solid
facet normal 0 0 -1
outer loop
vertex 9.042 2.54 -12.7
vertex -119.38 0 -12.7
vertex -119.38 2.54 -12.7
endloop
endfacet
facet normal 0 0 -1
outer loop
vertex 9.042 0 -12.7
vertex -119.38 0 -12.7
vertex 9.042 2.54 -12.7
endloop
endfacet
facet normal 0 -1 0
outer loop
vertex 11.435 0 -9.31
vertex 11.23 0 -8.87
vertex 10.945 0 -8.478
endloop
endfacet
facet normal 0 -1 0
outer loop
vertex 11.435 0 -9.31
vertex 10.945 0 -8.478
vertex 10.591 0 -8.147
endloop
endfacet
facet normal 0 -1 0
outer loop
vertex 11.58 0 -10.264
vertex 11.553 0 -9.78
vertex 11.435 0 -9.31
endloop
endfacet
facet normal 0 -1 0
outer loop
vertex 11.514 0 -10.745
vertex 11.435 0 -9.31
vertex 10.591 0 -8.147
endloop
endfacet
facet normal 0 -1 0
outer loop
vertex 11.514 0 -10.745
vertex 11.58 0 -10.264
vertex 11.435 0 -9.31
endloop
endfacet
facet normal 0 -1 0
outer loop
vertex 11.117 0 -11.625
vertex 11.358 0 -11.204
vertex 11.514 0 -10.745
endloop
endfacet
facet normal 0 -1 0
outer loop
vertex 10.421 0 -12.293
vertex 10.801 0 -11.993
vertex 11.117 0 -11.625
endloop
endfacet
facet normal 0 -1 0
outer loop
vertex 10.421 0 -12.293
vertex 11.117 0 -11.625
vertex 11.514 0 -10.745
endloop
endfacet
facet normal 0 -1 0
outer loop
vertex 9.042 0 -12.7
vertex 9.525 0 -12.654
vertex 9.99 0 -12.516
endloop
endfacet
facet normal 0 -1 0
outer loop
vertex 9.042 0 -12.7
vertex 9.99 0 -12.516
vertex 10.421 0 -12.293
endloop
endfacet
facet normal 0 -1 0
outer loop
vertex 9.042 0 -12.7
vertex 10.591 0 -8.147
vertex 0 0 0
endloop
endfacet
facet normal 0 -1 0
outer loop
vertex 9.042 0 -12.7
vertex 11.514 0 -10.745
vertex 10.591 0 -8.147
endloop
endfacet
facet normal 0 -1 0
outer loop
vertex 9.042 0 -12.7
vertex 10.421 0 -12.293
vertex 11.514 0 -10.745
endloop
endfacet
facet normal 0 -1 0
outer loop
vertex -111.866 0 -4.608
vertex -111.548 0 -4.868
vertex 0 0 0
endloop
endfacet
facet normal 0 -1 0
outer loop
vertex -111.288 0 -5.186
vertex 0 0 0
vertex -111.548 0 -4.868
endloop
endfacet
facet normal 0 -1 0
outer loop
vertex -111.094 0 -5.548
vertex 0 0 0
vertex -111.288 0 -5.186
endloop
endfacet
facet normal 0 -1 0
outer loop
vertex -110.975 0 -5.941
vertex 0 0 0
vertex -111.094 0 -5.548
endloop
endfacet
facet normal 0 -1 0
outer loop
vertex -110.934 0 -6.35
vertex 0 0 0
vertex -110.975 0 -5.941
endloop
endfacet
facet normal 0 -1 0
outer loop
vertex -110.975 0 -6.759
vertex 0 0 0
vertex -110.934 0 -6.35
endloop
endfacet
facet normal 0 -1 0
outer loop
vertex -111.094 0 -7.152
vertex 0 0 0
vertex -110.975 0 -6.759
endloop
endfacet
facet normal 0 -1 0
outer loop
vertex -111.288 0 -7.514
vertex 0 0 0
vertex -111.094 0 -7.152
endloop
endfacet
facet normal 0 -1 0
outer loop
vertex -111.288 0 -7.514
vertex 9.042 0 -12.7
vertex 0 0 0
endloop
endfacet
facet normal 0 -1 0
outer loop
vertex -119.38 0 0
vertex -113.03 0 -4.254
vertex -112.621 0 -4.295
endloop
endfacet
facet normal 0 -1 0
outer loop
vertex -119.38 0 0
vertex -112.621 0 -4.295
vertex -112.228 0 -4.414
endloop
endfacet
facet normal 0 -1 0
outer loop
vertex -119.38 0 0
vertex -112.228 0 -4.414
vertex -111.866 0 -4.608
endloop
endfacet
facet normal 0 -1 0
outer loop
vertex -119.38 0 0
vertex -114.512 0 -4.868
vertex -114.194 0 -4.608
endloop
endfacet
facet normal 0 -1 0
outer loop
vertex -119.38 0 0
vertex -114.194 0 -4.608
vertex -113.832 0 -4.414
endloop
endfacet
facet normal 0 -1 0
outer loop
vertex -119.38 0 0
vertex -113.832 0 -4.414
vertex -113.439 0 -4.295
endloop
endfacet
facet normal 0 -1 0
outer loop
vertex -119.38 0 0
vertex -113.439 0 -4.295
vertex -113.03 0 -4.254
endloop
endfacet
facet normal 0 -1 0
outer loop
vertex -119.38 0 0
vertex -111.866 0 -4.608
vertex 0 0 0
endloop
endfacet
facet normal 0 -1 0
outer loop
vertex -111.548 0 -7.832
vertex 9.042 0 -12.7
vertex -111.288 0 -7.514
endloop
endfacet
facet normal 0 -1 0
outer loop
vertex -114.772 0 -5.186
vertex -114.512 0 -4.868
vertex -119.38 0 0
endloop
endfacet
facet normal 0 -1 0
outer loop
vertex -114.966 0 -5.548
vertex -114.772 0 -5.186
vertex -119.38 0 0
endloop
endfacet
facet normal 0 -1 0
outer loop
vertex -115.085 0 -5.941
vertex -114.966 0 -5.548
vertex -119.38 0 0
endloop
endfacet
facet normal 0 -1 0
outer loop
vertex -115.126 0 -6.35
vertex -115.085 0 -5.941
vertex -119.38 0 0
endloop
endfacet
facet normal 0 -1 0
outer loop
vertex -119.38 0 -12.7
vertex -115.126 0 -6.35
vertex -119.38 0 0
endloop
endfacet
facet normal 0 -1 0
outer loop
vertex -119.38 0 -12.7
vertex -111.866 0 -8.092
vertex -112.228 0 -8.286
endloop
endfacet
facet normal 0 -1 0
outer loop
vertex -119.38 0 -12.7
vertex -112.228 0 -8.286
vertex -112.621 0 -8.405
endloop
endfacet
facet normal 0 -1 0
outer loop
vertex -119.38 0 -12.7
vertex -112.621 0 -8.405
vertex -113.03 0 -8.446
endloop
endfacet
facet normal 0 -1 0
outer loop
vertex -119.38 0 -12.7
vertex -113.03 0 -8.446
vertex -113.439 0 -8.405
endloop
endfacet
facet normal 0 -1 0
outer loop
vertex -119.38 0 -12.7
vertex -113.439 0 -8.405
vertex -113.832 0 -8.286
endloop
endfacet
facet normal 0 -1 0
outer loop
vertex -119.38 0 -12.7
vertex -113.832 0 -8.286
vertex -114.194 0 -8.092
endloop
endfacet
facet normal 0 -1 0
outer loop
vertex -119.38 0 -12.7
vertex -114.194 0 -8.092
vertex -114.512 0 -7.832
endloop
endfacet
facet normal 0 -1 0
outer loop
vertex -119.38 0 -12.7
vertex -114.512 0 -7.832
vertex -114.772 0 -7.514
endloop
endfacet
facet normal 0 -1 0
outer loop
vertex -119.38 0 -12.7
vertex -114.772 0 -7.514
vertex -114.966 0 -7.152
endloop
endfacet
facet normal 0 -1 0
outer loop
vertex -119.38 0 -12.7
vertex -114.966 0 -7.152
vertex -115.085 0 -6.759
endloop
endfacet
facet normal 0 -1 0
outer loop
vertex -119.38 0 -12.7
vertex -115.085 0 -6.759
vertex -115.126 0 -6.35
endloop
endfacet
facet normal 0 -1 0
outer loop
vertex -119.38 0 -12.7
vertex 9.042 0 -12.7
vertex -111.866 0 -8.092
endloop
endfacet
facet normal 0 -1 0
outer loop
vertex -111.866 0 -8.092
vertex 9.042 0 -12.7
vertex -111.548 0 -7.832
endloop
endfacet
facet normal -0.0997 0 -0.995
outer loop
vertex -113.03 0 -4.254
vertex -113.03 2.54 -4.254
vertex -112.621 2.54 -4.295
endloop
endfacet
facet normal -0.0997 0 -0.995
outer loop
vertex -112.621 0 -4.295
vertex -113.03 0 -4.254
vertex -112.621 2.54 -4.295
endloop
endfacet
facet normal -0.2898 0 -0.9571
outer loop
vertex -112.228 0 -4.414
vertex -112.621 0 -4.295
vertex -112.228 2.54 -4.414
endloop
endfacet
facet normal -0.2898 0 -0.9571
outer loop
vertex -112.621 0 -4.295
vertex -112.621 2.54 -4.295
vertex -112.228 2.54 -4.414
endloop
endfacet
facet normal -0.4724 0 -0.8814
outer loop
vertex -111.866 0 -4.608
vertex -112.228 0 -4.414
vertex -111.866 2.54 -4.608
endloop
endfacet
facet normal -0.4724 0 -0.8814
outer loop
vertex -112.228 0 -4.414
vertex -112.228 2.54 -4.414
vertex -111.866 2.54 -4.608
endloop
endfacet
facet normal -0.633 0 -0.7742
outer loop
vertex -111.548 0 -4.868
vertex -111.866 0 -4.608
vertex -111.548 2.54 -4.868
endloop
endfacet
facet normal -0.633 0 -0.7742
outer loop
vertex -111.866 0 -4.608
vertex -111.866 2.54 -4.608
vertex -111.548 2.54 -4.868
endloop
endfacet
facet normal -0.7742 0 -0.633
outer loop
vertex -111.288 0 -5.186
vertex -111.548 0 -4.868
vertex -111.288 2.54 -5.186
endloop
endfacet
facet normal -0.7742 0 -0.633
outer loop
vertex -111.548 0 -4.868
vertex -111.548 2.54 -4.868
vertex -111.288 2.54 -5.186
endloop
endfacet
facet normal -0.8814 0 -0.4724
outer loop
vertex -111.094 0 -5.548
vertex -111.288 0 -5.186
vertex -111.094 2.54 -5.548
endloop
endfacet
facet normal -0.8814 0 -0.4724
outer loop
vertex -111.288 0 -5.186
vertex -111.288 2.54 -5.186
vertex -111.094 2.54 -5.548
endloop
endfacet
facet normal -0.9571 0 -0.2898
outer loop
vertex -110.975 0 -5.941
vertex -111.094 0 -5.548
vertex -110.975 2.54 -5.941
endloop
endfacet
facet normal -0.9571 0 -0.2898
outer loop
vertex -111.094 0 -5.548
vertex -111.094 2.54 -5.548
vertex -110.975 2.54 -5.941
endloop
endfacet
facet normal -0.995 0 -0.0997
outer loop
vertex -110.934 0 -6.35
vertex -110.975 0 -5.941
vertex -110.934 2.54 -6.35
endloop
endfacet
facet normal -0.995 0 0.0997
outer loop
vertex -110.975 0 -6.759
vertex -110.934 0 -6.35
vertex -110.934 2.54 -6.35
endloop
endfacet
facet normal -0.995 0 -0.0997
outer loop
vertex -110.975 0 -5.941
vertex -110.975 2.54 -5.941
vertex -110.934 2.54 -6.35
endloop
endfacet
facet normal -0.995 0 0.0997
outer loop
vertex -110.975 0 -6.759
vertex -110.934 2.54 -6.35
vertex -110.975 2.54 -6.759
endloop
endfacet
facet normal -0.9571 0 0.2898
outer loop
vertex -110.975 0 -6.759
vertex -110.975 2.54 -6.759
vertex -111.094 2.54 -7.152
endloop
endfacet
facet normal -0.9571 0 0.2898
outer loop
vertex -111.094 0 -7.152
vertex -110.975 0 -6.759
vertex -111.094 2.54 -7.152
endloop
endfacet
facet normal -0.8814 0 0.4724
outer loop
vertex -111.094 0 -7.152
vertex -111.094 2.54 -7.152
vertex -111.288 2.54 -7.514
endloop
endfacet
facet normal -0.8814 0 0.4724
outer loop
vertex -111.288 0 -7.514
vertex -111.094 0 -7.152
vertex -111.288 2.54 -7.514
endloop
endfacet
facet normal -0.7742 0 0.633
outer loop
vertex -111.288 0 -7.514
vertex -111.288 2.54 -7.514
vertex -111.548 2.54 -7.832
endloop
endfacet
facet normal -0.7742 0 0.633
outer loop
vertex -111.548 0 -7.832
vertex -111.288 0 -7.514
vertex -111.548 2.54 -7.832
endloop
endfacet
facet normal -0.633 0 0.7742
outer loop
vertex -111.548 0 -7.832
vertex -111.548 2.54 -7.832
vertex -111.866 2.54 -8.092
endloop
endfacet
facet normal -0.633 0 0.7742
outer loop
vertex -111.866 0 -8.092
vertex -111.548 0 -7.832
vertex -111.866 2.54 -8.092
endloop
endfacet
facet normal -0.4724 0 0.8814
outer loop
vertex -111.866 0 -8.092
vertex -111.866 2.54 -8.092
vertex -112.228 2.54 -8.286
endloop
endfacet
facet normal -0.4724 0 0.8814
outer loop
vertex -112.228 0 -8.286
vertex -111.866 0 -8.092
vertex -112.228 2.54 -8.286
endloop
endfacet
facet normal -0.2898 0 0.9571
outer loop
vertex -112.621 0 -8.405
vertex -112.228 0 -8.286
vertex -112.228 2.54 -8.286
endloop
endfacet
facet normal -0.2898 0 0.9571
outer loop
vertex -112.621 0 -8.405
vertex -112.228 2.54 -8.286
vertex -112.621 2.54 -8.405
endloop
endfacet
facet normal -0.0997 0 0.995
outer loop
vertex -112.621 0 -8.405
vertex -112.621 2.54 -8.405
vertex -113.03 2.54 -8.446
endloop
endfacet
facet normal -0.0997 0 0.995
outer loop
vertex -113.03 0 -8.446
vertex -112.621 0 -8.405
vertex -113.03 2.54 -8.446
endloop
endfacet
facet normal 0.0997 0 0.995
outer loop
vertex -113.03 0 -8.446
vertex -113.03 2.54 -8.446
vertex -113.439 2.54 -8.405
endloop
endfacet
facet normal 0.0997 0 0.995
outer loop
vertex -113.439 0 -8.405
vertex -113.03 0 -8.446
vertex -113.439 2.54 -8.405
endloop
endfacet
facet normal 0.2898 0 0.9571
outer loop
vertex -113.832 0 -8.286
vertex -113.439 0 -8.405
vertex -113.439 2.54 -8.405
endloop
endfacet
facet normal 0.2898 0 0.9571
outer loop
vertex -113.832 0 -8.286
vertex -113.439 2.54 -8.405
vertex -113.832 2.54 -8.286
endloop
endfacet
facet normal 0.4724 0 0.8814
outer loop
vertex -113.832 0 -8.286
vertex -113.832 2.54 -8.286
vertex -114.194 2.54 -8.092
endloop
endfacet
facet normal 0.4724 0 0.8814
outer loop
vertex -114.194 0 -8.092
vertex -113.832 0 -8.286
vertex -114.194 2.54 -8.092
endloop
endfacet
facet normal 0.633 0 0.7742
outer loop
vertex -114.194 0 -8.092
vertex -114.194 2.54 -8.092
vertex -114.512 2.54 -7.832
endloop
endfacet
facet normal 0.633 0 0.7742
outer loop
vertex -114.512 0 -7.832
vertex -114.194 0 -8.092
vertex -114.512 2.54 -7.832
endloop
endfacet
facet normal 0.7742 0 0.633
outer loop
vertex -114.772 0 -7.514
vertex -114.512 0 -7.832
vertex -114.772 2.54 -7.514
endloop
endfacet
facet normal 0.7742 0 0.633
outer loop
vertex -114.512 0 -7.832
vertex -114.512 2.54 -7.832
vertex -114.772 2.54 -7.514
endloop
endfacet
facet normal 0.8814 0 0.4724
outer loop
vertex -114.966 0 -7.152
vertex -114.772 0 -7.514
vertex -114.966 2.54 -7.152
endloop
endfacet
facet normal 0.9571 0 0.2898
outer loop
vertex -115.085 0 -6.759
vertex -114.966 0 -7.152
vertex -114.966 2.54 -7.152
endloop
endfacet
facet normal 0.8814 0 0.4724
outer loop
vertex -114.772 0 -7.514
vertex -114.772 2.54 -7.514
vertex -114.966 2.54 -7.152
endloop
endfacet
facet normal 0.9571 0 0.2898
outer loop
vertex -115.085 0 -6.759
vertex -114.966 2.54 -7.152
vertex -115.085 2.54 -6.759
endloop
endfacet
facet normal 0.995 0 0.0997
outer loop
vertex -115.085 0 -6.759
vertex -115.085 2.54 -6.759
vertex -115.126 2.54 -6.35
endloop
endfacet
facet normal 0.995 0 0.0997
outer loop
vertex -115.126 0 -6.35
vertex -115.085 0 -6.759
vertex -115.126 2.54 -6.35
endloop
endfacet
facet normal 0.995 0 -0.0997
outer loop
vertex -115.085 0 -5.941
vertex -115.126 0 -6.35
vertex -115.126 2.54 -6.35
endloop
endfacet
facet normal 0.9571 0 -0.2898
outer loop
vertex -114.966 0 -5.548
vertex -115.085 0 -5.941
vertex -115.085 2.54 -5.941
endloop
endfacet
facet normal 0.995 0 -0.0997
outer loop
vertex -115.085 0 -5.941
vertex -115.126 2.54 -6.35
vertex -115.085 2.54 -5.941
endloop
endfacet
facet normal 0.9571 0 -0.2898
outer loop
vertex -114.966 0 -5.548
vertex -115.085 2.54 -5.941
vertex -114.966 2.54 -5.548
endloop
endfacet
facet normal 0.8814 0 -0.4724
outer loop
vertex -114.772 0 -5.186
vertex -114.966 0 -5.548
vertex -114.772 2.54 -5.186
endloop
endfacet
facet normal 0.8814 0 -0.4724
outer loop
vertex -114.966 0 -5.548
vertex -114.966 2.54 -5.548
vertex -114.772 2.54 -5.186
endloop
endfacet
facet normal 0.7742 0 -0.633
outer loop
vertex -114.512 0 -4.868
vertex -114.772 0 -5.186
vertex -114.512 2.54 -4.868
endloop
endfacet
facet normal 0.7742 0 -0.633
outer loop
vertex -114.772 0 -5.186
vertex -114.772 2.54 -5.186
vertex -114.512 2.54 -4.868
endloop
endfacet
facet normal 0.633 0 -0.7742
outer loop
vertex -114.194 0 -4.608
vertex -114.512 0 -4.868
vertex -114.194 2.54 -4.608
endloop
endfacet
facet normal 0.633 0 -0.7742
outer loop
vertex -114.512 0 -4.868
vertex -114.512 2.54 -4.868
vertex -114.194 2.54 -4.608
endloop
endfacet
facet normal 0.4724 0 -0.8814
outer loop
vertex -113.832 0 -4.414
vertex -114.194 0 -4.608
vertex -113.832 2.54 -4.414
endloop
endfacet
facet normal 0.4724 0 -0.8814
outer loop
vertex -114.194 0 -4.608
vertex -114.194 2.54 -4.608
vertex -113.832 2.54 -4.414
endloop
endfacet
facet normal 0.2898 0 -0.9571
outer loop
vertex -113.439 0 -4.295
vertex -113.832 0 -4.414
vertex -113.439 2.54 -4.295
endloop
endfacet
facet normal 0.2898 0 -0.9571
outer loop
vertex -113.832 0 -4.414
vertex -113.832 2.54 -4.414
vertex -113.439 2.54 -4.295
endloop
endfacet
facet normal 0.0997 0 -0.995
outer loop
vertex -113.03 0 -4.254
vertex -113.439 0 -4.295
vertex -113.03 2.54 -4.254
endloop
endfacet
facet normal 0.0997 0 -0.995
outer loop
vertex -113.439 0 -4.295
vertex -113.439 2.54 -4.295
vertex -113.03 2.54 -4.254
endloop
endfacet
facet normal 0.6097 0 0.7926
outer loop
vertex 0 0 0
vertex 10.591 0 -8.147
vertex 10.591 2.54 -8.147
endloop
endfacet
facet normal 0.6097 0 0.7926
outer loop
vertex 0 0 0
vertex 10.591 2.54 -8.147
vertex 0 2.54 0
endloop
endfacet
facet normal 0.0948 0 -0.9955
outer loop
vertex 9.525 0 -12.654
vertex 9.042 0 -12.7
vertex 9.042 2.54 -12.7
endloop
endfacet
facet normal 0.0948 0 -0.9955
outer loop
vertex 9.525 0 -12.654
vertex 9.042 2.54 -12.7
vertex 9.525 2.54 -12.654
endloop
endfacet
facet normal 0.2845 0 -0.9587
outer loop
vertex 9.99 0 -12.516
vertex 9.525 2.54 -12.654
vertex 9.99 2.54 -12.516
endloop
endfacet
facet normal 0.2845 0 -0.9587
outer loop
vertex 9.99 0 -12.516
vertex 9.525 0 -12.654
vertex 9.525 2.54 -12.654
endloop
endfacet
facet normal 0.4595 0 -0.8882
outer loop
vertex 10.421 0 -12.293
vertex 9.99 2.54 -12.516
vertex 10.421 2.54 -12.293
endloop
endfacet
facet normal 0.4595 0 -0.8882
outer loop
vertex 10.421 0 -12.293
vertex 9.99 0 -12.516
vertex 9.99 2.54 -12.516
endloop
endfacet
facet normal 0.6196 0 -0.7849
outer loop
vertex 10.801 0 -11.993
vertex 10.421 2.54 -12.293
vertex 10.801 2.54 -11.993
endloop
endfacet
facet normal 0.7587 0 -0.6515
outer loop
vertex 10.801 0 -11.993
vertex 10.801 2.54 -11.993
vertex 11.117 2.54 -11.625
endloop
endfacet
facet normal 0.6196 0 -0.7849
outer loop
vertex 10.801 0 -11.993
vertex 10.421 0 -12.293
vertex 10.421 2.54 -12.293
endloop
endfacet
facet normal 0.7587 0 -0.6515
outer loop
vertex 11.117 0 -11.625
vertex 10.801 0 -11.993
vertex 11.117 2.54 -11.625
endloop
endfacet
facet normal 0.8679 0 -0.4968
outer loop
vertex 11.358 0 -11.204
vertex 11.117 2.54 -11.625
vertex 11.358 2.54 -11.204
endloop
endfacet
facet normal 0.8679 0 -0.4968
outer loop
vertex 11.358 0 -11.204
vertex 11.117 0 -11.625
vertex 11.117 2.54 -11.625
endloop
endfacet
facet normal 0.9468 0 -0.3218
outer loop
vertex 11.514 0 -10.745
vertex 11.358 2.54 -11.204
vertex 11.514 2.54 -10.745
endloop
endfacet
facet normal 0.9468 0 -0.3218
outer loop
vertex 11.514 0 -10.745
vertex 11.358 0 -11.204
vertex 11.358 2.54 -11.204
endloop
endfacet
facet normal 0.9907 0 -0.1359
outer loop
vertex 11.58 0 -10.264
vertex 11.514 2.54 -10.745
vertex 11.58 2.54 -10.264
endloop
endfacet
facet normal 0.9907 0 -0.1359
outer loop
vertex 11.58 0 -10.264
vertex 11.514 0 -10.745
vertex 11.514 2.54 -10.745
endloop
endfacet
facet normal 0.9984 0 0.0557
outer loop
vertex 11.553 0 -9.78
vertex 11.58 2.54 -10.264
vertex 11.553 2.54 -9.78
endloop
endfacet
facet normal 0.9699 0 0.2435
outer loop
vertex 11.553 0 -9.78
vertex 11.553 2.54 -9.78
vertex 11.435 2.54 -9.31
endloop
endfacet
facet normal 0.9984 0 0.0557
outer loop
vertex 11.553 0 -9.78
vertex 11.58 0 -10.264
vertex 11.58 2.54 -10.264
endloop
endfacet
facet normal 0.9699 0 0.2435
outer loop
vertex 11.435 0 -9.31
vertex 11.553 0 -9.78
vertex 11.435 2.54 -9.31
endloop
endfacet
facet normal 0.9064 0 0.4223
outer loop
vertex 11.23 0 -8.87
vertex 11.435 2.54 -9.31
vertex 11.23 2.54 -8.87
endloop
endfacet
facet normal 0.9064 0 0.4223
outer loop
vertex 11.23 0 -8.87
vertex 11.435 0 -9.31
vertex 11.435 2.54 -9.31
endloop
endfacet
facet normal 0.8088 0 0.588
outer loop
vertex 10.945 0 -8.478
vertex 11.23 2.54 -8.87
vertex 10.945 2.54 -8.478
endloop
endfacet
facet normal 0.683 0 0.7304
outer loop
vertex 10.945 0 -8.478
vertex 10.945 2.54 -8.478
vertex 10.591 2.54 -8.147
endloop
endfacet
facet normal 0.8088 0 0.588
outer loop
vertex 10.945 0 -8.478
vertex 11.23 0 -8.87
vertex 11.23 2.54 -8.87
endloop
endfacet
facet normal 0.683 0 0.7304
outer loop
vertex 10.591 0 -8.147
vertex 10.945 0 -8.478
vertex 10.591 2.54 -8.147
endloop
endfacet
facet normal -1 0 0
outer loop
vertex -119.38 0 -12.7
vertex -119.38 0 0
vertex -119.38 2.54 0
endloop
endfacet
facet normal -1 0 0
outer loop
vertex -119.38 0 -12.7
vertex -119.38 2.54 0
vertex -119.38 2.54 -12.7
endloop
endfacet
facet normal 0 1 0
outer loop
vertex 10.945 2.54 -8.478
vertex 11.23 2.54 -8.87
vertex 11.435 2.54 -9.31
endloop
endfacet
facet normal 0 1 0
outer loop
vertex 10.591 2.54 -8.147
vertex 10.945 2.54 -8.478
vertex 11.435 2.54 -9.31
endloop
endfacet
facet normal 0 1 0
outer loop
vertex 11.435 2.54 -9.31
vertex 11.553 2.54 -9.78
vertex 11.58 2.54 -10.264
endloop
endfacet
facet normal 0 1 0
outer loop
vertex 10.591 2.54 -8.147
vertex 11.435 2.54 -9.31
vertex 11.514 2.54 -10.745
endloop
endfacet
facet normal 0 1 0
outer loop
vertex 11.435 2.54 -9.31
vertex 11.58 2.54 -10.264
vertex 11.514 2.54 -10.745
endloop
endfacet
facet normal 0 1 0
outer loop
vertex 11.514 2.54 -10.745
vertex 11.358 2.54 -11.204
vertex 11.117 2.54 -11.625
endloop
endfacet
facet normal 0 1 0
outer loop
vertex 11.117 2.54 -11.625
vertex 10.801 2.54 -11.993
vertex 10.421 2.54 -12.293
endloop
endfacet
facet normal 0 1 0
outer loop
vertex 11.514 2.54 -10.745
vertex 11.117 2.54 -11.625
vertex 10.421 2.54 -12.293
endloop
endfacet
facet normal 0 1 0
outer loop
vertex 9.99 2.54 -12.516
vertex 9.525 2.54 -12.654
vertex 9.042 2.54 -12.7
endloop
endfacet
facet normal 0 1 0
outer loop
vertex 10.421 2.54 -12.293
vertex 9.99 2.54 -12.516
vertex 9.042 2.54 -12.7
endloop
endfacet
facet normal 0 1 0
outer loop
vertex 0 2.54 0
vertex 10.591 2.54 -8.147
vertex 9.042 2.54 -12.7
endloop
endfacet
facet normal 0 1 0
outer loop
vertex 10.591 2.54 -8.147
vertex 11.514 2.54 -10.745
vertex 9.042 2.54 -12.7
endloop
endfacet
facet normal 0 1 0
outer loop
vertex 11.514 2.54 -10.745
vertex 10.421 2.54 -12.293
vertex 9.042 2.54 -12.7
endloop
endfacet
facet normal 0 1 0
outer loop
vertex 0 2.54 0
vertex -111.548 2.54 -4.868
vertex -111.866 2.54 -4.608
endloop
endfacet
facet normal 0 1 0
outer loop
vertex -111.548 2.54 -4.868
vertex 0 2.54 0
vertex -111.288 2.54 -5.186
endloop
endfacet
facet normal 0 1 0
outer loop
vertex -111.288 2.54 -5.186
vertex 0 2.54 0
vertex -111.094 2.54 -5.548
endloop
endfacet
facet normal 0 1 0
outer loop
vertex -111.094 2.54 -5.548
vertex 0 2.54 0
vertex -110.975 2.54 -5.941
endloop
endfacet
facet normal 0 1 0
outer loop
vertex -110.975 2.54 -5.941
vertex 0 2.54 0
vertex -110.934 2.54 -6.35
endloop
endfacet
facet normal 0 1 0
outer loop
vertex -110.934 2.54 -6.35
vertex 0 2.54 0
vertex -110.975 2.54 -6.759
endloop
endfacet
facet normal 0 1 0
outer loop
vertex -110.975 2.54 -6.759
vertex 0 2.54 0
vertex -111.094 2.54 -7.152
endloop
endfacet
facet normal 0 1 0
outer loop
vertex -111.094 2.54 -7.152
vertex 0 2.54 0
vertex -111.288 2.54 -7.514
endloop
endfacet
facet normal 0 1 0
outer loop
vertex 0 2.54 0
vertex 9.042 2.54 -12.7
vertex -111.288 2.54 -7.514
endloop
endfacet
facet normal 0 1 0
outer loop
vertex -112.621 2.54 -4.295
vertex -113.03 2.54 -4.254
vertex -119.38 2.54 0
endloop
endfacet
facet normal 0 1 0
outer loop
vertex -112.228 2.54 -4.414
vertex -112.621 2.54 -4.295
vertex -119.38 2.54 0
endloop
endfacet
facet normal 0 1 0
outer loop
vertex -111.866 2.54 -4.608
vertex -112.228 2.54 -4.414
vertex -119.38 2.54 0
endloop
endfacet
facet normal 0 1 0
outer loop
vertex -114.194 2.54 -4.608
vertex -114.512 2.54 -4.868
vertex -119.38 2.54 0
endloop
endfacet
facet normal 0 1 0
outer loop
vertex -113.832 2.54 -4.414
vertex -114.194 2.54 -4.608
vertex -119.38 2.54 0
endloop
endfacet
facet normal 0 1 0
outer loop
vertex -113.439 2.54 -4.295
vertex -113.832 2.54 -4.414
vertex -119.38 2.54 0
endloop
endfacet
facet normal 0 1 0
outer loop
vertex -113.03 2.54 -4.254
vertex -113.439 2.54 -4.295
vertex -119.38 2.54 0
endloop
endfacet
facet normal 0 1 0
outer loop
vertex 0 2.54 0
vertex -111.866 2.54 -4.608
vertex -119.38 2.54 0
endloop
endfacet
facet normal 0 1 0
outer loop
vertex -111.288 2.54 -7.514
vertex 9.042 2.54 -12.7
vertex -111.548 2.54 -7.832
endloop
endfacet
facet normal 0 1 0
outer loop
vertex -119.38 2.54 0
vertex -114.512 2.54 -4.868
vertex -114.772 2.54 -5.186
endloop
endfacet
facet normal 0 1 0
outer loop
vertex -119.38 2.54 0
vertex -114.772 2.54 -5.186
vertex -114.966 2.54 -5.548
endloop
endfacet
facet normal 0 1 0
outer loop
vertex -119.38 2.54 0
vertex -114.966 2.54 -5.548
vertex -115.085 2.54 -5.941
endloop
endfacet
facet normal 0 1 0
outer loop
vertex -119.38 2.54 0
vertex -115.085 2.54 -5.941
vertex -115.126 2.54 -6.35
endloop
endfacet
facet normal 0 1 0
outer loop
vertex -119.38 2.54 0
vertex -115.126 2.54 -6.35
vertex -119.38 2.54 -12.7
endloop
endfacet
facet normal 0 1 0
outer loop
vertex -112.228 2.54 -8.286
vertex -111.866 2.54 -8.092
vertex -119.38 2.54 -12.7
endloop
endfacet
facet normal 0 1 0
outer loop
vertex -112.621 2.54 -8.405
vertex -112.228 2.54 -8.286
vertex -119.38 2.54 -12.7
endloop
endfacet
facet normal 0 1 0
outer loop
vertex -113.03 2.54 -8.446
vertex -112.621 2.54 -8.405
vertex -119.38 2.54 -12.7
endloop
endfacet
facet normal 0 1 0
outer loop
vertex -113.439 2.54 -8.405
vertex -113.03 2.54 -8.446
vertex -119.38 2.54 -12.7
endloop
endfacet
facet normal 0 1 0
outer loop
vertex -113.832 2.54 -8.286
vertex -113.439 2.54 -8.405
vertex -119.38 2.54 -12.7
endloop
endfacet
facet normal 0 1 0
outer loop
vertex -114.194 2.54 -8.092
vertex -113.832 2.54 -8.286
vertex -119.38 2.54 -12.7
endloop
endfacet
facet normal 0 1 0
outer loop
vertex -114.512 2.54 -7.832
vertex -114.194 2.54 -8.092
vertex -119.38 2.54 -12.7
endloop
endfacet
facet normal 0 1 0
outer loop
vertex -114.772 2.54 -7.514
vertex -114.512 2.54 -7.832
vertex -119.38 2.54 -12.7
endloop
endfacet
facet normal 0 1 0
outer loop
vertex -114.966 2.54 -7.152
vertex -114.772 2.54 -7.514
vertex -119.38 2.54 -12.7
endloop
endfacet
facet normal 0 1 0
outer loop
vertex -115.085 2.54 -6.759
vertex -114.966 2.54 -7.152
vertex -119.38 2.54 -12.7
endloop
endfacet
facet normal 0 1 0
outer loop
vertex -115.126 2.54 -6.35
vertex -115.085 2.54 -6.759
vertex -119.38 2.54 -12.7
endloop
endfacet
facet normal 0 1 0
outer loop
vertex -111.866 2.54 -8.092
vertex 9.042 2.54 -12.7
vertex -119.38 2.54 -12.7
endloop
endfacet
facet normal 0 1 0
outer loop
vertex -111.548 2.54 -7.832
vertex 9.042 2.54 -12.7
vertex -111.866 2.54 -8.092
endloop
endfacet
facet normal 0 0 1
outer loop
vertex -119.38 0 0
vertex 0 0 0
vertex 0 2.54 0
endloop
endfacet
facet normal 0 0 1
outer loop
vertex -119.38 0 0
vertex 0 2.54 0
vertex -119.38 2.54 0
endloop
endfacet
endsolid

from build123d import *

# Parameters (mm, degrees)
BOSS_EXTRUDE1_DEPTH = 2.54
SKETCH4_R           = 2.0955
CUT_EXTRUDE2_DEPTH  = 121.080498


with BuildPart() as part:
    # Sketch1 → Boss-Extrude1 (new body)
    with BuildSketch(Plane(origin=(0, 0, 0), x_dir=(1, 0, 0), z_dir=(0, 1, 0))):
        with BuildLine():
            Line((0, 0), (-119.38, 0))
            Line((-119.38, 0), (-119.38, 12.7))
            Line((-119.38, 12.7), (9.042090255, 12.7))
            ThreePointArc((9.042090255, 12.7), (11.44680364, 10.977895798), (10.590755588, 8.146735068))
            Line((10.590755588, 8.146735068), (0, 0))
        make_face()
    extrude(amount=BOSS_EXTRUDE1_DEPTH)

    # Sketch4 → Cut-Extrude2 (cut, through all)
    with BuildSketch(Plane(origin=(0, 2.54, 0), x_dir=(1, 0, 0), z_dir=(0, 1, 0))):
        with Locations(Location((-113.03, 6.35, 0), (0, 0, 270))):
            Circle(SKETCH4_R)
    extrude(amount=-CUT_EXTRUDE2_DEPTH, mode=Mode.SUBTRACT)


solid = part.part
